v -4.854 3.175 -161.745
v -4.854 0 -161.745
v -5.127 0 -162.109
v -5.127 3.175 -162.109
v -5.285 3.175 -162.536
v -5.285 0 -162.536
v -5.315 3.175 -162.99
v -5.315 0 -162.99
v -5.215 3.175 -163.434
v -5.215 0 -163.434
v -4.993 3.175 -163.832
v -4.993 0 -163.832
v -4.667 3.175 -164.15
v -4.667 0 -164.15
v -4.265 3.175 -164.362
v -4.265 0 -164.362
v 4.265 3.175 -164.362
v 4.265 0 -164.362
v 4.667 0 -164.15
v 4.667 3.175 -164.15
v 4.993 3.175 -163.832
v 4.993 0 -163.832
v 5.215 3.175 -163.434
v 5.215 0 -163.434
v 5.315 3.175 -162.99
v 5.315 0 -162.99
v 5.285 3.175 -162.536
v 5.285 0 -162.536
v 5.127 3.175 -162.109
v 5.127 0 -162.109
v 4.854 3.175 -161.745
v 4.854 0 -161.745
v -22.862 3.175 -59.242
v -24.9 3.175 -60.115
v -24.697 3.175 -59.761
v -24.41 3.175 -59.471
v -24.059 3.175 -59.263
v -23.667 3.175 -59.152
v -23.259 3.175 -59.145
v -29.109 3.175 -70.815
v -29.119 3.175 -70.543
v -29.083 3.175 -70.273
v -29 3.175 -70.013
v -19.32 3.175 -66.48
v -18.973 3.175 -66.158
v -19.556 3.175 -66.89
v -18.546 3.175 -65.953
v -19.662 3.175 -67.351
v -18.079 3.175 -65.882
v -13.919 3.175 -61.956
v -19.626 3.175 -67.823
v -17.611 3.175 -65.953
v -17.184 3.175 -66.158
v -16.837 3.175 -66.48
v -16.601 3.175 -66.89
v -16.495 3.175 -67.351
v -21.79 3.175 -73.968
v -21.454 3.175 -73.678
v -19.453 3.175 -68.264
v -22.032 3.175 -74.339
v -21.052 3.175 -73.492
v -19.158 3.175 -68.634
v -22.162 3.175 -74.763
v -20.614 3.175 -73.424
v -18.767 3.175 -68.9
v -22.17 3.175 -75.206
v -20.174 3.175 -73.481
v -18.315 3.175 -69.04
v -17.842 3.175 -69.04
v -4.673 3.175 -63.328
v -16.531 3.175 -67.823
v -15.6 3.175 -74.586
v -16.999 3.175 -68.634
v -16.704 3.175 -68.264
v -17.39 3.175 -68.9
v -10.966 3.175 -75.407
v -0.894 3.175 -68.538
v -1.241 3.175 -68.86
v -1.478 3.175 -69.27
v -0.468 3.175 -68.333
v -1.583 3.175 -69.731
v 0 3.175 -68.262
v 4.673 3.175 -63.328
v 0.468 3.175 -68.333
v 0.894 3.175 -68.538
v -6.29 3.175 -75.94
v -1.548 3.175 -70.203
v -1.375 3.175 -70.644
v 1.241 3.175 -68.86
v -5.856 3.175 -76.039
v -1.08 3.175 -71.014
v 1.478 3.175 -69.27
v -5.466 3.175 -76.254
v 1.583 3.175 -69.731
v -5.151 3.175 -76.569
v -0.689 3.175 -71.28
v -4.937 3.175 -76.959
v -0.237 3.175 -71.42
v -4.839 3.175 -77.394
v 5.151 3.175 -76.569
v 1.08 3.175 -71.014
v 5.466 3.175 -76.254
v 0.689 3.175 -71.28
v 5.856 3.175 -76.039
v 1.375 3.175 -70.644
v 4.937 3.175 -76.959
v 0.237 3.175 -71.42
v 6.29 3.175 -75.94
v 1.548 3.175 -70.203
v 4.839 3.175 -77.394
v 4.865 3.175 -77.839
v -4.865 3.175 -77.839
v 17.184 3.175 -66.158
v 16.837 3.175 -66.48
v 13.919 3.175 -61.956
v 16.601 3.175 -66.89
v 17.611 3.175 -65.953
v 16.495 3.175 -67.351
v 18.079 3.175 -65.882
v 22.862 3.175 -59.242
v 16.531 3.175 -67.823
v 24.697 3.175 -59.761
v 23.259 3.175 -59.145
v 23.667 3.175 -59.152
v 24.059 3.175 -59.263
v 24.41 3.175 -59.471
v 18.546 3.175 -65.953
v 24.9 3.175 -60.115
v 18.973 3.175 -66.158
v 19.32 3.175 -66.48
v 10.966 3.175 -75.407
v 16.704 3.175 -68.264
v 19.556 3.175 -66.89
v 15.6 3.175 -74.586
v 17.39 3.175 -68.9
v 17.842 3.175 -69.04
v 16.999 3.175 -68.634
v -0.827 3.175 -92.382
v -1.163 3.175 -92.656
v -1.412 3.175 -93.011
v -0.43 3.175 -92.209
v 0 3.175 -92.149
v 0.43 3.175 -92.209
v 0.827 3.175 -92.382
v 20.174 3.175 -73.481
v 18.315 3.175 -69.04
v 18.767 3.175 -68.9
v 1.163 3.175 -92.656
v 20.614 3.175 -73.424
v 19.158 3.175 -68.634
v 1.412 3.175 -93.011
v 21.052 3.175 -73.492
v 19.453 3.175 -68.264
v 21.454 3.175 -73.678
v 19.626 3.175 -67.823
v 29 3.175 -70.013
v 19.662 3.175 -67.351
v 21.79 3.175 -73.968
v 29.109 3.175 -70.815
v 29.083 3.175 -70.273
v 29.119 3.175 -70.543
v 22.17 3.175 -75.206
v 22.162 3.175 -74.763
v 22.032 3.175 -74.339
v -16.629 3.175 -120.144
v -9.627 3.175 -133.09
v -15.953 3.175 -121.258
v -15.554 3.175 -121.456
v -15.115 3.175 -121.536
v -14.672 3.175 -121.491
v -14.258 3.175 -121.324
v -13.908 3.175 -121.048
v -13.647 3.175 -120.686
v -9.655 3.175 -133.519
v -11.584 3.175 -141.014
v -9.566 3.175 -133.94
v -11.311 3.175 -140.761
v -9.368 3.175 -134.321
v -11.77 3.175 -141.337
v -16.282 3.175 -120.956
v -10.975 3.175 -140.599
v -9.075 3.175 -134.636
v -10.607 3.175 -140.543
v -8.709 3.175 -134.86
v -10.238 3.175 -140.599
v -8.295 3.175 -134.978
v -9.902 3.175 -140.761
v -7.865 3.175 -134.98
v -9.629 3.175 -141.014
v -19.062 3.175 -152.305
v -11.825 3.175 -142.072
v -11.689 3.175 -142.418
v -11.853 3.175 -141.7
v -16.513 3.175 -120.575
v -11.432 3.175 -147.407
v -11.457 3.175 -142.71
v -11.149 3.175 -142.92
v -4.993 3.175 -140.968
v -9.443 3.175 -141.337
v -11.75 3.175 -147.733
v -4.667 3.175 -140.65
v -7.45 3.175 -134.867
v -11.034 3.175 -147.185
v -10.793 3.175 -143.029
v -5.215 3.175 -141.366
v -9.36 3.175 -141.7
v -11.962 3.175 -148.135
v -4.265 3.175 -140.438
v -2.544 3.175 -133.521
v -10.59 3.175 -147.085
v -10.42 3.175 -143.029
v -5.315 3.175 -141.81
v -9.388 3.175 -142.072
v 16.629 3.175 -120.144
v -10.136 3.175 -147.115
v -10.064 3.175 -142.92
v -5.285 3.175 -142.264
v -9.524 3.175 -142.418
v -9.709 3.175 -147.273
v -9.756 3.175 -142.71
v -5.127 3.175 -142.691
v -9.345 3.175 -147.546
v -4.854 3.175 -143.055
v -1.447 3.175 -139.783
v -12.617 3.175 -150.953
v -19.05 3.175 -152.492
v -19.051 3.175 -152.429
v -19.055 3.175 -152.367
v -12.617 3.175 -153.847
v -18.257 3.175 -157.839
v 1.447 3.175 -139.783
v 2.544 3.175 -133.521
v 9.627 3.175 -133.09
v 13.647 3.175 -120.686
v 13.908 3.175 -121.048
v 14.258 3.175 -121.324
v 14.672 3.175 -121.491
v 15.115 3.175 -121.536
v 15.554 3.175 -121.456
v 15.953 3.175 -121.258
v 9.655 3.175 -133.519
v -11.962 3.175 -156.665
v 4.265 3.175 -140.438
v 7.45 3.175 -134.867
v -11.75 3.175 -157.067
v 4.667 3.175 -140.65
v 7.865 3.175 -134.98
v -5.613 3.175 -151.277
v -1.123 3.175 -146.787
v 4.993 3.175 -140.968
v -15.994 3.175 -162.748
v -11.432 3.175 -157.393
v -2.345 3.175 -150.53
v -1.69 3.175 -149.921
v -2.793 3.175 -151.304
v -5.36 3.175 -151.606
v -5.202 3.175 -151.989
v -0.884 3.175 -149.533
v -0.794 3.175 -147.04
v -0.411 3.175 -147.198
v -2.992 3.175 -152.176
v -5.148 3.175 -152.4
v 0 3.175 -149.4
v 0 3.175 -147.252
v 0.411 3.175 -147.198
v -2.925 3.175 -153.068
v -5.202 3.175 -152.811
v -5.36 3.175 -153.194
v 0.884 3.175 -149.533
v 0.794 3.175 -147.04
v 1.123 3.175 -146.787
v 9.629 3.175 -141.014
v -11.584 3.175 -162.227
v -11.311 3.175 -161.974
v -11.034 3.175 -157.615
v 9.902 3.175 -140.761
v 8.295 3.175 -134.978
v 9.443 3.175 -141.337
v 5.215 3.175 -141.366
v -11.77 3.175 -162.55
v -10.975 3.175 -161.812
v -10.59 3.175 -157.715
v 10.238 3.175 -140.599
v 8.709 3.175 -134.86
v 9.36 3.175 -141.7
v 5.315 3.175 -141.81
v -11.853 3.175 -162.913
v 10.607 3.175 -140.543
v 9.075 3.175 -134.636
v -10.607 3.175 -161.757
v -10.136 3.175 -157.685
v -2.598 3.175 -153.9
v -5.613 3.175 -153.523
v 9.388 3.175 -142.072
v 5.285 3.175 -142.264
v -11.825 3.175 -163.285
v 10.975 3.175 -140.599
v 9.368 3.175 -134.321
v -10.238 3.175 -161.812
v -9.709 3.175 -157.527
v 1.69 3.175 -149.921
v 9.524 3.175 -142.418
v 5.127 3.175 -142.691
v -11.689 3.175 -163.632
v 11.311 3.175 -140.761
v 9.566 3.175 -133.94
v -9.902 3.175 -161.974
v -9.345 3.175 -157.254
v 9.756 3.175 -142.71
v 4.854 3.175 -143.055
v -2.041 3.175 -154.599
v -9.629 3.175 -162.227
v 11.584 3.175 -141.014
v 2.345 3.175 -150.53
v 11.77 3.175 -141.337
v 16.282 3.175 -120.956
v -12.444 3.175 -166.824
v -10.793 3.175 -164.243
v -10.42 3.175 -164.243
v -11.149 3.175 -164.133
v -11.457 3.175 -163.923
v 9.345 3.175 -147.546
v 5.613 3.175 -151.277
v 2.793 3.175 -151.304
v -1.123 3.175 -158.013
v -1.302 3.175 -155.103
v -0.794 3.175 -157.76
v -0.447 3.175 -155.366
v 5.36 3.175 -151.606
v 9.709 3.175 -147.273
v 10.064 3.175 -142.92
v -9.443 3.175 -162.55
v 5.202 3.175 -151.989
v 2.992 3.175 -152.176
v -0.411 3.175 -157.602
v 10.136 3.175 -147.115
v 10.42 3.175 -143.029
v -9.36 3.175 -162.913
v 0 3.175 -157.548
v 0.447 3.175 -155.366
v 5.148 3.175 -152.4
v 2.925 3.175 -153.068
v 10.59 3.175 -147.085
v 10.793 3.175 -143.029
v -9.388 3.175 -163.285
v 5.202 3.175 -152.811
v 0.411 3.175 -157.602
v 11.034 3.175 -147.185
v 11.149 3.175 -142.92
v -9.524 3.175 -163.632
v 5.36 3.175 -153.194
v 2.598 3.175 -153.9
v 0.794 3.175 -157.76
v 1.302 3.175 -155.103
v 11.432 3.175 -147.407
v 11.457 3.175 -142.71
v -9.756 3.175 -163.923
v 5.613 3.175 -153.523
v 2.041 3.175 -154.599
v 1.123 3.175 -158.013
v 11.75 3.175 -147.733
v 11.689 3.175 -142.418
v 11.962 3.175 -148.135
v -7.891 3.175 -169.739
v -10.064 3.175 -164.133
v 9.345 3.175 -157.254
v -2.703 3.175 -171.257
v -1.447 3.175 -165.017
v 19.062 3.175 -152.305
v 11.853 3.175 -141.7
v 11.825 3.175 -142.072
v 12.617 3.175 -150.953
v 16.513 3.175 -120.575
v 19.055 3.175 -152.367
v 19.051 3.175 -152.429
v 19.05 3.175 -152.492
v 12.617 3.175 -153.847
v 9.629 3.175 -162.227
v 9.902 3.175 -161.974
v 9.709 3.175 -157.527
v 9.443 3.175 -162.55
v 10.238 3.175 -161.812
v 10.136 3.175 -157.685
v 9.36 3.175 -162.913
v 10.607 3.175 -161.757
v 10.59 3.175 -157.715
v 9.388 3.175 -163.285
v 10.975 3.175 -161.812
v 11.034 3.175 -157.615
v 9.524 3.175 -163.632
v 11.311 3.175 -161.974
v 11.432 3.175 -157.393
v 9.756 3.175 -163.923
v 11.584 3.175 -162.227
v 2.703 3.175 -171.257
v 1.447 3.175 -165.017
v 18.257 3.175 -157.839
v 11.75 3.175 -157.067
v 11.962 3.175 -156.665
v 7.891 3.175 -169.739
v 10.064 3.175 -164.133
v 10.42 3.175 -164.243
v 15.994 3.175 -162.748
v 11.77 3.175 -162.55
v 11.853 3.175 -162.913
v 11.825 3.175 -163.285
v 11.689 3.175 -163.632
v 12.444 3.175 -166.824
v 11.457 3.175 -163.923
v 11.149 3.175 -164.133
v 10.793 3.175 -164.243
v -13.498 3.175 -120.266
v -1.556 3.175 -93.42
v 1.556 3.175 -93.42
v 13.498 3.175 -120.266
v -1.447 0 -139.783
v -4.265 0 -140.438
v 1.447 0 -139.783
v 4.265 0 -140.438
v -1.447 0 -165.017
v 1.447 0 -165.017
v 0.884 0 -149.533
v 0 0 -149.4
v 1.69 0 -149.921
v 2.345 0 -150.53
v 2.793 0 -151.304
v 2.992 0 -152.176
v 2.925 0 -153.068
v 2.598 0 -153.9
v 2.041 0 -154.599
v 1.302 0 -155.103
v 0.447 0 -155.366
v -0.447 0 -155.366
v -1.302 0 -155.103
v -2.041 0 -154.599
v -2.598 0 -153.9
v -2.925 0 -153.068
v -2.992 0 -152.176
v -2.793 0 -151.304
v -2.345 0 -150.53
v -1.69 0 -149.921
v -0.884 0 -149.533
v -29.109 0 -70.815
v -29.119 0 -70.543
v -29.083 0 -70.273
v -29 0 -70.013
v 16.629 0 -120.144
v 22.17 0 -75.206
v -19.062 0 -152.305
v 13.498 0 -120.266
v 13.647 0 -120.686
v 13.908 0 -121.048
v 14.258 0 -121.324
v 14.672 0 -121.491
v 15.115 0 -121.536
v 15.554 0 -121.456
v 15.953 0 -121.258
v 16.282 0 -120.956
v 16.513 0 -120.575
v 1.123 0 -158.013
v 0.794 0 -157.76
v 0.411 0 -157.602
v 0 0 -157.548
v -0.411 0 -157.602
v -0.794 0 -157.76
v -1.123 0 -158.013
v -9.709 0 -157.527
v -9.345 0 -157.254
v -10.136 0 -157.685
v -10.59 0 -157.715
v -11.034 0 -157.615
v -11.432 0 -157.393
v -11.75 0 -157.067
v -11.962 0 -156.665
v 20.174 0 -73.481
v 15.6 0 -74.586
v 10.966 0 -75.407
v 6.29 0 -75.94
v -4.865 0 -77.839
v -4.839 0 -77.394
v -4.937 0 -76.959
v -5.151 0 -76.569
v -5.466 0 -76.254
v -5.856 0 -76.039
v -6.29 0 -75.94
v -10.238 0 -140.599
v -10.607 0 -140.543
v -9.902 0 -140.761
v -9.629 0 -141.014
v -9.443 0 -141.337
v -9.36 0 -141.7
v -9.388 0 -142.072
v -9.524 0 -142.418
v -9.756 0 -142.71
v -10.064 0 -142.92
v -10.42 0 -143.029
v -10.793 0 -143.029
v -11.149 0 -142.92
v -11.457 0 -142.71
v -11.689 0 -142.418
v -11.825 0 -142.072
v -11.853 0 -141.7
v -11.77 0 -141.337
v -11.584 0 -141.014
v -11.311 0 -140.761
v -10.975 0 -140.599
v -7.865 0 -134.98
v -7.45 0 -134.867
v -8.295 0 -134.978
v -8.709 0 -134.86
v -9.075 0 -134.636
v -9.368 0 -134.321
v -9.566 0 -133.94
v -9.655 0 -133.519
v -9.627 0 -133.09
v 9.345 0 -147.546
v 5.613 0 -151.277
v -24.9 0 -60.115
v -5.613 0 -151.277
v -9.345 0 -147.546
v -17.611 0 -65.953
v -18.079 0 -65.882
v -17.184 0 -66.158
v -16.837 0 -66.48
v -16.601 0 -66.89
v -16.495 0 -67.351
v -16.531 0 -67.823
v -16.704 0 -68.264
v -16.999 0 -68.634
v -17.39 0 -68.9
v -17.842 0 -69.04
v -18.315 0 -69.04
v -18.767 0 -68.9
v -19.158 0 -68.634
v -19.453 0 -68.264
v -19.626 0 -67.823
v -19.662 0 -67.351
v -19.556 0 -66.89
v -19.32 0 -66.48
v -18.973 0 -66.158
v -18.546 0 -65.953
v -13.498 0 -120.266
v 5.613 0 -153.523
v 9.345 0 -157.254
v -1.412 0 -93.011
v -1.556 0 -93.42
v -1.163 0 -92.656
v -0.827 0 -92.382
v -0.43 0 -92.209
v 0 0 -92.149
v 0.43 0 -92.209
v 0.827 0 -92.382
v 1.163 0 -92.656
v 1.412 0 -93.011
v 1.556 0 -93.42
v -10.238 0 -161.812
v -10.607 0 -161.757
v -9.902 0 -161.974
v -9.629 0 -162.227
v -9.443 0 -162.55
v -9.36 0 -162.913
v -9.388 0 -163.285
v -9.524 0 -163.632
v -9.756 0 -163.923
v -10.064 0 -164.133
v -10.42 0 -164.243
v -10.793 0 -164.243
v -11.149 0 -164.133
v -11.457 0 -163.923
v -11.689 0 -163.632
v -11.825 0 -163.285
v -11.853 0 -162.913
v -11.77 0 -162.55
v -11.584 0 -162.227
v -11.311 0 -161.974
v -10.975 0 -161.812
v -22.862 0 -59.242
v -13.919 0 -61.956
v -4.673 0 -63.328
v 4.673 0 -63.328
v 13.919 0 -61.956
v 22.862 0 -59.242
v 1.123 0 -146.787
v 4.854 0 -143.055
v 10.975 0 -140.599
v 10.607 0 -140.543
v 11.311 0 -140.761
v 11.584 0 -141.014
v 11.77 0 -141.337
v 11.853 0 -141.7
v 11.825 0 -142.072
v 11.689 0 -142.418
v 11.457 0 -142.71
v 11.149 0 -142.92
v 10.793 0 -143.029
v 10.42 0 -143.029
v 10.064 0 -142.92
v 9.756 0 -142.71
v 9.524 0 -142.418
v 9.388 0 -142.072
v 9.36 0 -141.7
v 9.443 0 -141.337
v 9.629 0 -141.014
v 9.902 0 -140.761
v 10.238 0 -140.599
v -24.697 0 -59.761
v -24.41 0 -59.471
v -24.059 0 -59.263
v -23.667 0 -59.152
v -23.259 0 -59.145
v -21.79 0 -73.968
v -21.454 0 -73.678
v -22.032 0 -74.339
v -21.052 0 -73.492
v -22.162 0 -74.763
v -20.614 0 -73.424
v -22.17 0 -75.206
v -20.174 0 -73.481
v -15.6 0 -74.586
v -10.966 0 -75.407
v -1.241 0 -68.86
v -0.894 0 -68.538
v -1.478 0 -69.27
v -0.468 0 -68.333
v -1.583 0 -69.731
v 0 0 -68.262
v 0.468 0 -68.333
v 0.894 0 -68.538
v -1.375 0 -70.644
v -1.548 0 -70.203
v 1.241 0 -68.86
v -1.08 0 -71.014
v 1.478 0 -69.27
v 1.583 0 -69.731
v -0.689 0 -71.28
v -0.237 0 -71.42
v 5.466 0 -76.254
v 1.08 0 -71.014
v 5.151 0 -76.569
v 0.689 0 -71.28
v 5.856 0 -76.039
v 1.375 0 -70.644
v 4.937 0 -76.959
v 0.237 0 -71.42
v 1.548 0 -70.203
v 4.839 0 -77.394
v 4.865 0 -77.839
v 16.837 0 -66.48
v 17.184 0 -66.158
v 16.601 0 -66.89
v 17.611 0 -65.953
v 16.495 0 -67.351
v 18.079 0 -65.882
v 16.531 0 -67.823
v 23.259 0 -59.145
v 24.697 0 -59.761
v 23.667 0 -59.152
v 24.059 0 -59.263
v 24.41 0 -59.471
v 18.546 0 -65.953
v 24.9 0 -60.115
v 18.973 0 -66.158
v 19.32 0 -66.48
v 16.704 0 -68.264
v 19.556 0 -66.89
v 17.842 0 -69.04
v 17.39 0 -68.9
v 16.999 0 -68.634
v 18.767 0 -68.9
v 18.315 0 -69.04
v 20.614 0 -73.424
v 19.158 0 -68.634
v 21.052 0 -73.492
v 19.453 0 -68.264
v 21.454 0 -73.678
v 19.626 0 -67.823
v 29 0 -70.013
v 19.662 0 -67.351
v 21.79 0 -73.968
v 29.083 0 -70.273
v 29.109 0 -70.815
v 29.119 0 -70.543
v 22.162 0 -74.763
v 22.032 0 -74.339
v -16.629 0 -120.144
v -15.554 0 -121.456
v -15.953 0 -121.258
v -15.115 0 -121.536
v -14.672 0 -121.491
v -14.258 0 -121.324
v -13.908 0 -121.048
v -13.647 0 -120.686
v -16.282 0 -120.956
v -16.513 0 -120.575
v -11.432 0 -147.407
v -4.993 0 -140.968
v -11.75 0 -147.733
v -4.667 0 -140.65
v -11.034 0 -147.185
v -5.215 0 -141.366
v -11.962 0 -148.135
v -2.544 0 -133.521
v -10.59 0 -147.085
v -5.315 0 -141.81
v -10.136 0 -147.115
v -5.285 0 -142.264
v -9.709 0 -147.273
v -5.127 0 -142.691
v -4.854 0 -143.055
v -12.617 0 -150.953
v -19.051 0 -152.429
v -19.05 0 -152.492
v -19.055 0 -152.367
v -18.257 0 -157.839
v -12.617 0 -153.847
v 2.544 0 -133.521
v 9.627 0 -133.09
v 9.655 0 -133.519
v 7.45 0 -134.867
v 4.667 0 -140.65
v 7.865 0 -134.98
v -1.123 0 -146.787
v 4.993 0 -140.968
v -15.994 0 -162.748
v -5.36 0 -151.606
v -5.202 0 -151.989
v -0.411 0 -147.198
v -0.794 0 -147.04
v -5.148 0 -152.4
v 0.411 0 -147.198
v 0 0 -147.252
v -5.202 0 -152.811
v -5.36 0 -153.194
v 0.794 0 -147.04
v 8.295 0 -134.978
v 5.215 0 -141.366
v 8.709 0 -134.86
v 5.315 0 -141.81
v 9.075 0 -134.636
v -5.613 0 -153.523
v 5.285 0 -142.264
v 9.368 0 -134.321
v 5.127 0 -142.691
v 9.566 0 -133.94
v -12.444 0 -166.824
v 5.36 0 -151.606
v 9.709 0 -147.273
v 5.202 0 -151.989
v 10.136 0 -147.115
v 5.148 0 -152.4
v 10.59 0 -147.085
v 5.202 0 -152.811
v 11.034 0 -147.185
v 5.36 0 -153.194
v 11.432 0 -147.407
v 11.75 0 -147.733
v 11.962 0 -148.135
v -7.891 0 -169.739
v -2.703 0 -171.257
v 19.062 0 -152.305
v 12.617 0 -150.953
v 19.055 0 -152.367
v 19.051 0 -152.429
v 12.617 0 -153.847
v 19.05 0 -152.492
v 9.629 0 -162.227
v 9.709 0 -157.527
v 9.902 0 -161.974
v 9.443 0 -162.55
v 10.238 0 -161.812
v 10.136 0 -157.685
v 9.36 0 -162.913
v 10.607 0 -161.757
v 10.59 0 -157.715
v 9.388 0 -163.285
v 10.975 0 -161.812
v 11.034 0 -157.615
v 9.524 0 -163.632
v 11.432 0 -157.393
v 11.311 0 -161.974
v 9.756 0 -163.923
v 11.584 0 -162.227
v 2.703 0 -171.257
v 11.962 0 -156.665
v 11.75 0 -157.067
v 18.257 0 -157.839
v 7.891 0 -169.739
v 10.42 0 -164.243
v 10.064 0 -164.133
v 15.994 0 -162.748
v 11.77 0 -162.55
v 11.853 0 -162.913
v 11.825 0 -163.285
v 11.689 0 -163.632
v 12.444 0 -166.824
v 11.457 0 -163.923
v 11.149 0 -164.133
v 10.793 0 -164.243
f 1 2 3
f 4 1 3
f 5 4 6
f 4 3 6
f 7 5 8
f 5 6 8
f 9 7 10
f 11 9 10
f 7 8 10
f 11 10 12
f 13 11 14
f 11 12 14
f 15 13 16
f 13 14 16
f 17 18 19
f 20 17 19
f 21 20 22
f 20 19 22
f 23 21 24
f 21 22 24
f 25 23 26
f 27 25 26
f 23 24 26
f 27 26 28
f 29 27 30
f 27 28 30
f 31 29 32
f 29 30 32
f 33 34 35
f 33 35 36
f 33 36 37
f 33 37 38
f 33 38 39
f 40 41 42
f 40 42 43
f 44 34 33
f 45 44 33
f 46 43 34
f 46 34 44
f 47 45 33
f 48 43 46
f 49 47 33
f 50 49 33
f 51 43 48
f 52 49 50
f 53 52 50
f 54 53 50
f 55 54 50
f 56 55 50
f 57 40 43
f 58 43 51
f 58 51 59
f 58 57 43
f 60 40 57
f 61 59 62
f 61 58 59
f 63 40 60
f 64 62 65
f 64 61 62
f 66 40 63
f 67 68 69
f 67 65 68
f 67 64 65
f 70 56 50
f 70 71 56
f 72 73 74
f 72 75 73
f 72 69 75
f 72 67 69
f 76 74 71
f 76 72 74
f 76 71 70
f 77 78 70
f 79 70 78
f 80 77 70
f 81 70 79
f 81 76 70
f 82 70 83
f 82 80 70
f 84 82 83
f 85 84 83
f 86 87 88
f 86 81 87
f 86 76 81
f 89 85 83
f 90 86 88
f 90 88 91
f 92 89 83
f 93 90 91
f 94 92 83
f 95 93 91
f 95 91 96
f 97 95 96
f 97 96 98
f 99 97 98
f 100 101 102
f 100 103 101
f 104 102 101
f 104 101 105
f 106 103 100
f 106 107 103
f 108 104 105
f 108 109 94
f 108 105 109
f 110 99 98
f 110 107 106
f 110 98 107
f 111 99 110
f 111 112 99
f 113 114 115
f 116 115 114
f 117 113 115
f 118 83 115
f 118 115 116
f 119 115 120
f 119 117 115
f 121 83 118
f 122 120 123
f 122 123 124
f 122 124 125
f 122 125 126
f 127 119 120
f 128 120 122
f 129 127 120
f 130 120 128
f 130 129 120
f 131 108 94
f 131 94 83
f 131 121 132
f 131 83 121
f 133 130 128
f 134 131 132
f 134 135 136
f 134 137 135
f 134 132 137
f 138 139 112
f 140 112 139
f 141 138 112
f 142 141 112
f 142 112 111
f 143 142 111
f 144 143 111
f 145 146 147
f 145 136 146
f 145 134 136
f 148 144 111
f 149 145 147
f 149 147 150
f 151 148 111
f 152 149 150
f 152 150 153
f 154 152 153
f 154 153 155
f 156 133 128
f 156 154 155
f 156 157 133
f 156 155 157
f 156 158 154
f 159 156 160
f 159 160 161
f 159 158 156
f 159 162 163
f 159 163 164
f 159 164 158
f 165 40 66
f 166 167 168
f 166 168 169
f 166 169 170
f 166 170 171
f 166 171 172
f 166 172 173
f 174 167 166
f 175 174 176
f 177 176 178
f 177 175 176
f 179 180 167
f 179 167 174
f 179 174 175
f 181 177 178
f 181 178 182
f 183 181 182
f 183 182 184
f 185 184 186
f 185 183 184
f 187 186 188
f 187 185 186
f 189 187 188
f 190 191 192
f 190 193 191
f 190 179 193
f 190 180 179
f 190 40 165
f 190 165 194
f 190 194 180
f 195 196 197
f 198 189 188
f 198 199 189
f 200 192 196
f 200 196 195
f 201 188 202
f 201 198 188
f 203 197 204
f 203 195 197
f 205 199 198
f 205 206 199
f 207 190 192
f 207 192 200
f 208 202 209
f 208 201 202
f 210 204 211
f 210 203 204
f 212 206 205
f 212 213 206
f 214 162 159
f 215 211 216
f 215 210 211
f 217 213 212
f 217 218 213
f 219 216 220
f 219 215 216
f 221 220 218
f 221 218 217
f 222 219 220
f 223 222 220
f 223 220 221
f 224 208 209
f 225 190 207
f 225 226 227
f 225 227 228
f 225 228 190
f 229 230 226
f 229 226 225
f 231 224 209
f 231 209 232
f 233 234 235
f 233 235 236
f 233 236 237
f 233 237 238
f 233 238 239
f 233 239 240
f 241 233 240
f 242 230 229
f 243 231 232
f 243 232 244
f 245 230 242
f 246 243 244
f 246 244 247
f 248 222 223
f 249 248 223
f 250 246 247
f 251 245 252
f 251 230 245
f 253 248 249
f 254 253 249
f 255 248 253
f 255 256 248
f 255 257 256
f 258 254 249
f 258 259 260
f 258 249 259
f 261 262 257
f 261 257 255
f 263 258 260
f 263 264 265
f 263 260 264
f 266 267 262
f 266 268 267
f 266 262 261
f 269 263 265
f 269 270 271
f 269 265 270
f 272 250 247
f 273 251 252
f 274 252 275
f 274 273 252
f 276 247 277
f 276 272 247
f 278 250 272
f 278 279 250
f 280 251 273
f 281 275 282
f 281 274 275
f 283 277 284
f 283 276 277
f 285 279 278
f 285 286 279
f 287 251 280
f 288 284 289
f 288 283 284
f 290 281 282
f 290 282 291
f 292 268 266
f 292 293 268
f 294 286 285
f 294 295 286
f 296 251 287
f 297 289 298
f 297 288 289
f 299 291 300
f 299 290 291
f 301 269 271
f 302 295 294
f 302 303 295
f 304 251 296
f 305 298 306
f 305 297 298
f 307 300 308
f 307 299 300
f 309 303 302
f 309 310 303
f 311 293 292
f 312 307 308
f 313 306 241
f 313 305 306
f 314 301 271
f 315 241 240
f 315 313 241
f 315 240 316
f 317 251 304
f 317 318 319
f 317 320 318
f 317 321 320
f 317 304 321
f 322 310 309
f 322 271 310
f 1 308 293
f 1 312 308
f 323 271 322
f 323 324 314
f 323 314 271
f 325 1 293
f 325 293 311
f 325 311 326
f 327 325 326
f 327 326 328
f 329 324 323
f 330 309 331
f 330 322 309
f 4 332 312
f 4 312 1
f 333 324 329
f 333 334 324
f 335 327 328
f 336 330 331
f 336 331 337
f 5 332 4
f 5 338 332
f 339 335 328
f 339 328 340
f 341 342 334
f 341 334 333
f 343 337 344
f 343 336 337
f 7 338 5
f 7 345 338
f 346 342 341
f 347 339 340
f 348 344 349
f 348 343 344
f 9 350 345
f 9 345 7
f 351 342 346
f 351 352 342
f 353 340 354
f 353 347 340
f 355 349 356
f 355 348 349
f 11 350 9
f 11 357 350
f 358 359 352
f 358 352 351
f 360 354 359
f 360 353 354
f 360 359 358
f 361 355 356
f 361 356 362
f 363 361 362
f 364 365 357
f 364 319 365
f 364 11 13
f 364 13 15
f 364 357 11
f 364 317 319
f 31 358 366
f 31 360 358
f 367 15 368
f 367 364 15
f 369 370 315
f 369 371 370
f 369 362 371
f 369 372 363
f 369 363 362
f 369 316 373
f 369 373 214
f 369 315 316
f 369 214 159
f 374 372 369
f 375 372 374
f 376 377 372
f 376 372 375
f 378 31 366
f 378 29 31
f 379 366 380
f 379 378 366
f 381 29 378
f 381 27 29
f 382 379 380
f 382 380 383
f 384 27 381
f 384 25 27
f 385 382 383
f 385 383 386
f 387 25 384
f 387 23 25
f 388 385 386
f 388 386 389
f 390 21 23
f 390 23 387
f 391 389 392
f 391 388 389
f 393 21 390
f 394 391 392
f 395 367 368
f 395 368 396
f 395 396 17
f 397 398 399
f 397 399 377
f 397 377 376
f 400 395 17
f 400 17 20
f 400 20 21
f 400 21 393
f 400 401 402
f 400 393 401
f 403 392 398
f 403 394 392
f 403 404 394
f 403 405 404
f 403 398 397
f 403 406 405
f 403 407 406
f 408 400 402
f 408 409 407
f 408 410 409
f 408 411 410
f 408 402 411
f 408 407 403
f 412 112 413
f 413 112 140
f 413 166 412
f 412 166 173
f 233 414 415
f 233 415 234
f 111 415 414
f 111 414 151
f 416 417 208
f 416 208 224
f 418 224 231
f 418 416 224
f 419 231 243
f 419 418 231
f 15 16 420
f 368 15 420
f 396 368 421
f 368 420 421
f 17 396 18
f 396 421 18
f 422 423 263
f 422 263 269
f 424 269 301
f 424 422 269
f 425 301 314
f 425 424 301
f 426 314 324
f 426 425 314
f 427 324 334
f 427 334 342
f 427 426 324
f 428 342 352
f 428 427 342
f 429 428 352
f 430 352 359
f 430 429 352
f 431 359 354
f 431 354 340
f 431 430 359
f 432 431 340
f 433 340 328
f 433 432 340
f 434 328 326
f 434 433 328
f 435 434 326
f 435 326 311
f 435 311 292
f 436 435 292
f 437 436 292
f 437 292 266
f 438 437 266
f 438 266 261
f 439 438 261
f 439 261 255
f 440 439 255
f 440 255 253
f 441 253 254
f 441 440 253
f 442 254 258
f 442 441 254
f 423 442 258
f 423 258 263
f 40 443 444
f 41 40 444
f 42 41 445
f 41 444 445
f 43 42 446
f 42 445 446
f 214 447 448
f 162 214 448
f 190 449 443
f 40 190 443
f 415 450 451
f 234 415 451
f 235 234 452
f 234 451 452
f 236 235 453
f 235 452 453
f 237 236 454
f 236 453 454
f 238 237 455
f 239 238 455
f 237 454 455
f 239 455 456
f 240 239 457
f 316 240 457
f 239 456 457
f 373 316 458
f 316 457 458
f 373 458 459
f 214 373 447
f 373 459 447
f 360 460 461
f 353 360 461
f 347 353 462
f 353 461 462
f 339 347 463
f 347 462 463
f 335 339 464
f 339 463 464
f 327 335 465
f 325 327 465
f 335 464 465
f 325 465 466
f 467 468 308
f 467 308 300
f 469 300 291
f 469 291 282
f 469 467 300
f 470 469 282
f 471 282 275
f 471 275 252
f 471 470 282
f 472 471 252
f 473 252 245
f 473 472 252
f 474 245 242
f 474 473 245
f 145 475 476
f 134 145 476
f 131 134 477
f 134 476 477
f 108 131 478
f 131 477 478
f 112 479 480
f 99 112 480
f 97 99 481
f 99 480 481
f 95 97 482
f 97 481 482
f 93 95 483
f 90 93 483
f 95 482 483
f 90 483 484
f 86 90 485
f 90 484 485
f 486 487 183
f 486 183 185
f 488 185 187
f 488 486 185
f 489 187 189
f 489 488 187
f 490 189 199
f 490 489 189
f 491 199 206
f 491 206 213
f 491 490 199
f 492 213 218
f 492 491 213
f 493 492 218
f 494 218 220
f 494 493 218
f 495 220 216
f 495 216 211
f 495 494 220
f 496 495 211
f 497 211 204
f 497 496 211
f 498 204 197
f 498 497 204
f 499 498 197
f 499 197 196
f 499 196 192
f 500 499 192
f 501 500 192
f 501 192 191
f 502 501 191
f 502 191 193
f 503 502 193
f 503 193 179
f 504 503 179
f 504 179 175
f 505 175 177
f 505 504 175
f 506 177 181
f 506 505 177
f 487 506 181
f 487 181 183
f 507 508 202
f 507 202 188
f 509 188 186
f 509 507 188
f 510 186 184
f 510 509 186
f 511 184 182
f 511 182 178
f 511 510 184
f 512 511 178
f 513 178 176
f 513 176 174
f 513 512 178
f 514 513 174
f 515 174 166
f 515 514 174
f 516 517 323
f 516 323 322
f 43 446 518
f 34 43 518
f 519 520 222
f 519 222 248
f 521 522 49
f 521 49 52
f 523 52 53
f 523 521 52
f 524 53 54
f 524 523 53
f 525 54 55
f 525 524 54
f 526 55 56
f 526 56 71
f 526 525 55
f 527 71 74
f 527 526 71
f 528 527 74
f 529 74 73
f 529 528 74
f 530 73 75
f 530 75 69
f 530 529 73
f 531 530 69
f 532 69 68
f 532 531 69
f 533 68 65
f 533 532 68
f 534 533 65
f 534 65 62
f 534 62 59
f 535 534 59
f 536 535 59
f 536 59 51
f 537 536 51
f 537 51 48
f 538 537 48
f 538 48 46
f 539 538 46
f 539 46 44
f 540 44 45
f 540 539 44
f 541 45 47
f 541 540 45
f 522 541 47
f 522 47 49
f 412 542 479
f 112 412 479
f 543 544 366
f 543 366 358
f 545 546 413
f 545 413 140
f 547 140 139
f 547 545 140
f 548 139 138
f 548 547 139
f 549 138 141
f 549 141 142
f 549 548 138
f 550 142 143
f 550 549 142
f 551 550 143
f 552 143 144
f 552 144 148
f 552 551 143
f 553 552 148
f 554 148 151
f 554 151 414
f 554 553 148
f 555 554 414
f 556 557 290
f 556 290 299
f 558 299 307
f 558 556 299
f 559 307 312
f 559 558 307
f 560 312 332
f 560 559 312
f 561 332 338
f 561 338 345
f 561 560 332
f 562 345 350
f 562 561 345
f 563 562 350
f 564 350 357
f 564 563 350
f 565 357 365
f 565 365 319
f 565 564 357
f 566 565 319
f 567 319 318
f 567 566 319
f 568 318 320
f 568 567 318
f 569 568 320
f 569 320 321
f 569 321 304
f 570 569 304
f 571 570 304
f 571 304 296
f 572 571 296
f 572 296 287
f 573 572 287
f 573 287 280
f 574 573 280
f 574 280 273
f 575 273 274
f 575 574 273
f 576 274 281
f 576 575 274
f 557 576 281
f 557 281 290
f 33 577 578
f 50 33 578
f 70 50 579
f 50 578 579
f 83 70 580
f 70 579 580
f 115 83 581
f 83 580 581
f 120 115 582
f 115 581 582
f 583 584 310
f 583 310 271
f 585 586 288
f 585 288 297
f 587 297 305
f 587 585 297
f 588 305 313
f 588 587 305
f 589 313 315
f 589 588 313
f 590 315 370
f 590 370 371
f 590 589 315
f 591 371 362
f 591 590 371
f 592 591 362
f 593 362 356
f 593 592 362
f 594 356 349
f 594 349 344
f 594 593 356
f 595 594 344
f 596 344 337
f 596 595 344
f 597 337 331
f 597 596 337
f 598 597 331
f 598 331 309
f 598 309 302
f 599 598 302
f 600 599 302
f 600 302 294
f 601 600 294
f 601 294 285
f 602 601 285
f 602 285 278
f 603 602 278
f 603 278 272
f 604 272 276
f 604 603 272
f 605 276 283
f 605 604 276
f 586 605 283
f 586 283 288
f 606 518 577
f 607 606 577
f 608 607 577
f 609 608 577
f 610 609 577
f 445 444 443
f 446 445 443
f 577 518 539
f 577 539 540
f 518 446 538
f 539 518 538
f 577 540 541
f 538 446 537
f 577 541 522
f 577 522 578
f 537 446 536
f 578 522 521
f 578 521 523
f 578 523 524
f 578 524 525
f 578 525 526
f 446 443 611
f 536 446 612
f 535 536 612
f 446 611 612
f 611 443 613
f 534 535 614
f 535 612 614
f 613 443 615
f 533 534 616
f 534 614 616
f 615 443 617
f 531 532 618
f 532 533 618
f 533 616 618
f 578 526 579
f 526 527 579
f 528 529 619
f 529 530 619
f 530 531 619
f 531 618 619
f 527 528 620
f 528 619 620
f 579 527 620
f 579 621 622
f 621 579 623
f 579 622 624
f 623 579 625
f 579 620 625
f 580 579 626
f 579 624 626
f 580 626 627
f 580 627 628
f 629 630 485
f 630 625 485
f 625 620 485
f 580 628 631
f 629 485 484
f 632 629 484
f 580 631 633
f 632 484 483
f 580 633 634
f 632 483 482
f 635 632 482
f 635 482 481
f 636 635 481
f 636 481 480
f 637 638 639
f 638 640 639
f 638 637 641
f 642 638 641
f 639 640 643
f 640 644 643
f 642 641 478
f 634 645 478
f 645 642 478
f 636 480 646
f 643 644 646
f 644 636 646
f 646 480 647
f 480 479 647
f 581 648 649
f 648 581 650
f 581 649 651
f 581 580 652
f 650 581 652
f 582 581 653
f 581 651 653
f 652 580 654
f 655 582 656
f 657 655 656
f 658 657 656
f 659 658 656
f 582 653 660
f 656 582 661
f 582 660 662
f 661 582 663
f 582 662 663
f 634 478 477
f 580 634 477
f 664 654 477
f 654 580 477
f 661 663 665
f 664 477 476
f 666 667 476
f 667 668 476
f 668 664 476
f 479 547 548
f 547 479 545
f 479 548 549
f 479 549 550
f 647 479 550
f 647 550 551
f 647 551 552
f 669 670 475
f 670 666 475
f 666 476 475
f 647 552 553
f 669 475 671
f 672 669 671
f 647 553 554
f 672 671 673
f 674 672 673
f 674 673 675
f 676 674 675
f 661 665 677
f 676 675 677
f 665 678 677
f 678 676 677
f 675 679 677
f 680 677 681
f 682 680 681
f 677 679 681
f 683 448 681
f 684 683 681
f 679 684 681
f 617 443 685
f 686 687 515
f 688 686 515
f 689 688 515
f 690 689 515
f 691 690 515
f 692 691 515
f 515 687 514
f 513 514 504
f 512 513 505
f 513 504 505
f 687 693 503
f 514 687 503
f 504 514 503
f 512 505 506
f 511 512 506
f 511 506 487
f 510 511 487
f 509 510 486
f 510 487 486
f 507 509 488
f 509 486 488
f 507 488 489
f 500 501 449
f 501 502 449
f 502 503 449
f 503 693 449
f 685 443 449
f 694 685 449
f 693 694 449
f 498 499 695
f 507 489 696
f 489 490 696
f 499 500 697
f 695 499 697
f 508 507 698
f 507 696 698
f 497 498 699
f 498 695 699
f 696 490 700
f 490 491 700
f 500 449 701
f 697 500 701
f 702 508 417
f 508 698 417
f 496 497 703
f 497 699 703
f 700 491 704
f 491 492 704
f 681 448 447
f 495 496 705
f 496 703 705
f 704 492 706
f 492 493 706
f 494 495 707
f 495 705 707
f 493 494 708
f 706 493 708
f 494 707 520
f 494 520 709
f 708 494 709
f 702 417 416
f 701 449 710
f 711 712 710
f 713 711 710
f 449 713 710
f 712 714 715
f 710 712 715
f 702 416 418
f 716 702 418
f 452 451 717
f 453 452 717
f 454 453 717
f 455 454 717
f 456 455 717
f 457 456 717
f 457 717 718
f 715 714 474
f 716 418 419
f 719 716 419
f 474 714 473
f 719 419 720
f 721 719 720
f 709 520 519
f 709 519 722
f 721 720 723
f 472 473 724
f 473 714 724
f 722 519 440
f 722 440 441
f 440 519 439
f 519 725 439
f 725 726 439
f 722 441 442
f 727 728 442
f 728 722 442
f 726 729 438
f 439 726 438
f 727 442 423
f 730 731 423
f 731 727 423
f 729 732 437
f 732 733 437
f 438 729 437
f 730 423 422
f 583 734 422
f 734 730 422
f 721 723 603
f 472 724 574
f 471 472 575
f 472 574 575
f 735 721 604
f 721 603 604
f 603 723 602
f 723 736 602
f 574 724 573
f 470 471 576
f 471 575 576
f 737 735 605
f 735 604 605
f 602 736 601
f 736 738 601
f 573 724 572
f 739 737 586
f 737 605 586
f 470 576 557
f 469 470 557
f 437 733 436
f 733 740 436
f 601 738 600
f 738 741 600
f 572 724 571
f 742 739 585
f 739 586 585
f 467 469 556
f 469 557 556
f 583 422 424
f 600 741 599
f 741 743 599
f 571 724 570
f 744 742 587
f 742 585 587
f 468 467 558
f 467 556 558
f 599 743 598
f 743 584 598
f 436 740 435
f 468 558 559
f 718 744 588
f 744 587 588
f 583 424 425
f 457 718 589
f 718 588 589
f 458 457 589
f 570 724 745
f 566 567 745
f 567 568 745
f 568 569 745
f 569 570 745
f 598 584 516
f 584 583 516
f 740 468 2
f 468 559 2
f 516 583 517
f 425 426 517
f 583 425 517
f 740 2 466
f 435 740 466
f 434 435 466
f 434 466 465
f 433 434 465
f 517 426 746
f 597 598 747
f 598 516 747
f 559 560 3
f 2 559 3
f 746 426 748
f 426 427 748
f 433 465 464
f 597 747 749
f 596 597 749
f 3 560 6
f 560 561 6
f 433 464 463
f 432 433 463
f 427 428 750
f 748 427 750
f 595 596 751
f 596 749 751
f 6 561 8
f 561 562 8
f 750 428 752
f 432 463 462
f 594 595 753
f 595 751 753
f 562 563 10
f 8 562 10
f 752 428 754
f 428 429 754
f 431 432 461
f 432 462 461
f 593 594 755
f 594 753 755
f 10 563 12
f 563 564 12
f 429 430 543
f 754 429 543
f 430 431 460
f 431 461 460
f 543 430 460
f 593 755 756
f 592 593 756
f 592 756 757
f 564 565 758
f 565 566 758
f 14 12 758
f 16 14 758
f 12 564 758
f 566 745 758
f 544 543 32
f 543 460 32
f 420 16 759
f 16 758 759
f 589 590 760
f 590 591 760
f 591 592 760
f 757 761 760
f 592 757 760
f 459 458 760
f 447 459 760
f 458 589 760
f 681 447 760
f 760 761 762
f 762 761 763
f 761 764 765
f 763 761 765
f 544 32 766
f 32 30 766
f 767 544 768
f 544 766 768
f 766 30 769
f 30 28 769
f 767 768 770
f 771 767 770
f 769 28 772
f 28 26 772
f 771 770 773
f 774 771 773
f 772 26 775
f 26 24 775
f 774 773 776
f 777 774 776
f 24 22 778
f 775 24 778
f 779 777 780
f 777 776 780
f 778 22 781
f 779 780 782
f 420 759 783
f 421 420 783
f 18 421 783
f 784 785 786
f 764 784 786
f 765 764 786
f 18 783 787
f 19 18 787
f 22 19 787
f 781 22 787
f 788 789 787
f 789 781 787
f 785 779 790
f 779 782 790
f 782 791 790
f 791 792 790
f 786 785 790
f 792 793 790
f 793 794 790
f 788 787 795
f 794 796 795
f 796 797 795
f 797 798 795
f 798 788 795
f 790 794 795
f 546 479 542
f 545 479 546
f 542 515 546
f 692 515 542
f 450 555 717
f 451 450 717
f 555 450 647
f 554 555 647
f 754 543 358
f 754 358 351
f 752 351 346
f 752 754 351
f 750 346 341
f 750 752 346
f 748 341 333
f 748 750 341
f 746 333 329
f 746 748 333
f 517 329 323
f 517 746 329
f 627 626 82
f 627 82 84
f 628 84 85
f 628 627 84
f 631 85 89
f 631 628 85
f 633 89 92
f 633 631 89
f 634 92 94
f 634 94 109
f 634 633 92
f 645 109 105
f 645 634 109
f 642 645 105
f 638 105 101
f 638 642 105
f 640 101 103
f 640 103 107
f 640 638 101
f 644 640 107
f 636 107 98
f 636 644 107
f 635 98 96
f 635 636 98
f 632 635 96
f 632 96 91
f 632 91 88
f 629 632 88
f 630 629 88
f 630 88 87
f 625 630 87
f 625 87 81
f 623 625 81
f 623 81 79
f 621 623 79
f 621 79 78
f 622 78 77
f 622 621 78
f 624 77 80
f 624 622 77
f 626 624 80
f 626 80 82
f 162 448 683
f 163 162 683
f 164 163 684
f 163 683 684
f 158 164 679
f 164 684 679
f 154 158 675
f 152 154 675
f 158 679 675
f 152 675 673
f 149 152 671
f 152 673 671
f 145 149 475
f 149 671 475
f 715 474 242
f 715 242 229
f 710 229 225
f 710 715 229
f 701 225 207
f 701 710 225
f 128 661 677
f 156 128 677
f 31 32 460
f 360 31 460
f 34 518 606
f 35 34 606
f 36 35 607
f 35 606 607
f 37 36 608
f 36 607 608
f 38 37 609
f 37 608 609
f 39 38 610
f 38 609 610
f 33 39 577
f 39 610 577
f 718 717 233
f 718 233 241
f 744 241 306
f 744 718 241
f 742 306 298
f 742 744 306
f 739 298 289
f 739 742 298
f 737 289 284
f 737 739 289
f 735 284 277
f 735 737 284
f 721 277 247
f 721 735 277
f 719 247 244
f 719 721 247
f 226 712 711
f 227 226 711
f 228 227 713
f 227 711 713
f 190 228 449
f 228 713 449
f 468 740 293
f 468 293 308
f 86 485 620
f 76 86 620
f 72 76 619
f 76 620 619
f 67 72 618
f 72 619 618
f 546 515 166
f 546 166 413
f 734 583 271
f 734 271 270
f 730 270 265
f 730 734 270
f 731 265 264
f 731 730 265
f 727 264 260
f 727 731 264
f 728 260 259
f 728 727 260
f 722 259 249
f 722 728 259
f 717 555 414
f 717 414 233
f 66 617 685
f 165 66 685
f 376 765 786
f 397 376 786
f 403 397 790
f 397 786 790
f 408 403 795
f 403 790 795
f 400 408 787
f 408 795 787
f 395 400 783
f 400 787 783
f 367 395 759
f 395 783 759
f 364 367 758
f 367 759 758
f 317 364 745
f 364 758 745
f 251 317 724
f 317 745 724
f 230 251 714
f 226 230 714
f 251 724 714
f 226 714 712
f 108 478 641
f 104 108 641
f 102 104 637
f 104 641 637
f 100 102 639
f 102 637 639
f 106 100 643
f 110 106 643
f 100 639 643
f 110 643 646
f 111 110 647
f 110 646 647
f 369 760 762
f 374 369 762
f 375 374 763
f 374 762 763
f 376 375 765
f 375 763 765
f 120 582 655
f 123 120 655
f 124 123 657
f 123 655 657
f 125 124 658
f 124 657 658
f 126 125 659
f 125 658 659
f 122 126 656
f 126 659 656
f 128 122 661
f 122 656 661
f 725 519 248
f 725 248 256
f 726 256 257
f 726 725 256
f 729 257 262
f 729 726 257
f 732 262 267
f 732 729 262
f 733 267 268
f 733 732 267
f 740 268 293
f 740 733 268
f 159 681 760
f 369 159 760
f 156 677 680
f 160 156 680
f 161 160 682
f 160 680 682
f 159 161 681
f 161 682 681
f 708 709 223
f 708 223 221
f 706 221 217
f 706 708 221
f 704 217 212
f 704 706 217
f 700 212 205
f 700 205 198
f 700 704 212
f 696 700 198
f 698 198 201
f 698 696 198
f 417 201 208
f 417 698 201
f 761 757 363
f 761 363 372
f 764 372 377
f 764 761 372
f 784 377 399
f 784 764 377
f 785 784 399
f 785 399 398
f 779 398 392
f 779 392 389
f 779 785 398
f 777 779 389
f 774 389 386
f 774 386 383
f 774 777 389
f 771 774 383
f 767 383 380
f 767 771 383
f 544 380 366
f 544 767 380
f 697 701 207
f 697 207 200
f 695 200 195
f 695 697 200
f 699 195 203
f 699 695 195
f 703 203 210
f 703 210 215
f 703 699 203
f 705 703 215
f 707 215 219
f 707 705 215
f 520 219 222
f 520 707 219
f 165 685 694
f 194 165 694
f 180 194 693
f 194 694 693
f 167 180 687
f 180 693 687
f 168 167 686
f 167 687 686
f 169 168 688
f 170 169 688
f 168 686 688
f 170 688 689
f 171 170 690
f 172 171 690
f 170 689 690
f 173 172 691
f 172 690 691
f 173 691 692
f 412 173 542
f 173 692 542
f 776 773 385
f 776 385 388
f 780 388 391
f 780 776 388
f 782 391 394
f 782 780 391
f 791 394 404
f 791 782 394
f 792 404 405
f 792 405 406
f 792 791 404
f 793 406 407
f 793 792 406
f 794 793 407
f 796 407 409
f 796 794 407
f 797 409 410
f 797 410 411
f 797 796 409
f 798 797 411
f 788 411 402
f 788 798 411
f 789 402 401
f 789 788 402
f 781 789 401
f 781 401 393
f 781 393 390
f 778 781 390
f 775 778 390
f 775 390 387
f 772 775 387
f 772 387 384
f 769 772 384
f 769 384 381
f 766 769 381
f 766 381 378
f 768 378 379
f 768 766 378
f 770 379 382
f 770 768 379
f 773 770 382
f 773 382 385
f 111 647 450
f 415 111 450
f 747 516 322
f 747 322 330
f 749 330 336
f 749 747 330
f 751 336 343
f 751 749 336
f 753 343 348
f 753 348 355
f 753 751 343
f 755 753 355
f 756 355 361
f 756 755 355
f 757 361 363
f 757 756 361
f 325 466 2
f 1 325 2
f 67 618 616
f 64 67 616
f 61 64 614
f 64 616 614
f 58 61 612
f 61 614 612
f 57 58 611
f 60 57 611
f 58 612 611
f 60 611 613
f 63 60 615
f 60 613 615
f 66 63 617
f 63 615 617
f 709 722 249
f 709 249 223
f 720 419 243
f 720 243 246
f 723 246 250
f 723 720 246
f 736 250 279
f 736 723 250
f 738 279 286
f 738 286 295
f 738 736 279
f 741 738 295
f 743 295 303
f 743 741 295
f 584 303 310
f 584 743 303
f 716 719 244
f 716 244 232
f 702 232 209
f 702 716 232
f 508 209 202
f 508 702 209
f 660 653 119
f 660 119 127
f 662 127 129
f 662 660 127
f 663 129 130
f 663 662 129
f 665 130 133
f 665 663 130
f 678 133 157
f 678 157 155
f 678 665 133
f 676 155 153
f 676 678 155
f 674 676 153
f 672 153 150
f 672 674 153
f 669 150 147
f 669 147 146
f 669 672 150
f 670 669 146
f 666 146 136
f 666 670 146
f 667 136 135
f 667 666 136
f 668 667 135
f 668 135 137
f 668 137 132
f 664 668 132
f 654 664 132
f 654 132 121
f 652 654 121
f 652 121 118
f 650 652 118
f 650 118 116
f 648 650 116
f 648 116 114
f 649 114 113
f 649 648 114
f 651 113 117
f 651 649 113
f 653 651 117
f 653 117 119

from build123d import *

# Parameters (mm, degrees)
SKETCH1_R           = 1.25
SKETCH1_R_2         = 1.5875
SKETCH1_R_3         = 1.587499999
SKETCH1_R_4         = 3
BOSS_EXTRUDE1_DEPTH = 3.175


with BuildPart() as part:
    # Sketch1 → Boss-Extrude1 (new body)
    with BuildSketch(Plane(origin=(0, 0, 0), x_dir=(1, 0, 0), z_dir=(0, 1, 0))):
        with BuildLine():
            Line((-19.061691445, 152.305177286), (-29.109279467, 70.814859111))
            ThreePointArc((-29.109279467, 70.814859111), (-29.106764186, 70.406916612), (-29.000369251, 70.01308476))
            Line((-29.000369251, 70.01308476), (-24.900498144, 60.115120329))
            ThreePointArc((-24.900498144, 60.115120329), (-24.059191565, 59.263489811), (-22.862282328, 59.241590515))
            ThreePointArc((-22.862282328, 59.241590515), (0, 63.5), (22.862282328, 59.241590515))
            ThreePointArc((22.862282328, 59.241590515), (24.059191565, 59.263489811), (24.900498144, 60.115120329))
            Line((24.900498144, 60.115120329), (29.000369251, 70.01308476))
            ThreePointArc((29.000369251, 70.01308476), (29.106764186, 70.406916612), (29.109279467, 70.814859111))
            Line((29.109279467, 70.814859111), (19.061691445, 152.305177286))
            ThreePointArc((19.061691445, 152.305177286), (19.052985039, 152.398309253), (19.049778848, 152.491792328))
            ThreePointArc((19.049778848, 152.491792328), (0, 171.45), (-19.049778848, 152.491792328))
            ThreePointArc((-19.049778848, 152.491792328), (-19.052985039, 152.398309253), (-19.061691445, 152.305177286))
        make_face()
        with Locations(Location((-10.606601718, 163.006601718, 0), (0, 0, 270))):
            Circle(SKETCH1_R, mode=Mode.SUBTRACT)
        with Locations(Location((0, 69.85, 0), (0, 0, 270))):
            Circle(SKETCH1_R_2, mode=Mode.SUBTRACT)
        with Locations(Location((18.0785103, 67.469918962, 0), (0, 0, 270))):
            Circle(SKETCH1_R_2, mode=Mode.SUBTRACT)
        with Locations(Location((10.606601718, 163.006601718, 0), (0, 0, 270))):
            Circle(SKETCH1_R, mode=Mode.SUBTRACT)
        with Locations(Location((10.606601718, 141.793398282, 0), (0, 0, 270))):
            Circle(SKETCH1_R, mode=Mode.SUBTRACT)
        with Locations(Location((-10.606601718, 141.793398282, 0), (0, 0, 270))):
            Circle(SKETCH1_R, mode=Mode.SUBTRACT)
        with Locations(Location((-18.078510302, 67.469918971, 0), (0, 0, 270))):
            Circle(SKETCH1_R_3, mode=Mode.SUBTRACT)
        with Locations(Location((0, 152.4, 0), (0, 0, 270))):
            Circle(SKETCH1_R_4, mode=Mode.SUBTRACT)
        with BuildLine():
            Line((-13.497810395, 120.266290898), (-4.865408959, 77.838541906))
            ThreePointArc((-4.865408959, 77.838541906), (-5.15124286, 76.569257194), (-6.289995152, 75.939949704))
            ThreePointArc((-6.289995152, 75.939949704), (-13.288948331, 75.032285399), (-20.173905346, 73.480974021))
            ThreePointArc((-20.173905346, 73.480974021), (-21.632306598, 73.810794489), (-22.169764015, 75.206092049))
            Line((-22.169764015, 75.206092049), (-16.629007128, 120.144045384))
            ThreePointArc((-16.629007128, 120.144045384), (-15.115368796, 121.53607252), (-13.497810395, 120.266290898))
        make_face(mode=Mode.SUBTRACT)
        with BuildLine():
            Line((-9.626782179, 133.089731304), (-1.555627758, 93.42047862))
            ThreePointArc((-1.555627758, 93.42047862), (0, 92.149488537), (1.555627758, 93.42047862))
            Line((1.555627758, 93.42047862), (9.626782179, 133.089731304))
            ThreePointArc((9.626782179, 133.089731304), (9.075338598, 134.635781943), (7.450296388, 134.867299588))
            ThreePointArc((7.450296388, 134.867299588), (0, 133.35), (-7.450296388, 134.867299588))
            ThreePointArc((-7.450296388, 134.867299588), (-9.075338598, 134.635781943), (-9.626782179, 133.089731304))
        make_face(mode=Mode.SUBTRACT)
        with BuildLine():
            Line((4.854451798, 161.744579859), (1.122532015, 158.012660076))
            ThreePointArc((1.122532015, 158.012660076), (0, 157.547692091), (-1.122532015, 158.012660076))
            Line((-1.122532015, 158.012660076), (-4.854451798, 161.744579859))
            ThreePointArc((-4.854451798, 161.744579859), (-5.280651093, 163.215805982), (-4.265051181, 164.36241357))
            ThreePointArc((-4.265051181, 164.36241357), (0, 165.1), (4.265051181, 164.36241357))
            ThreePointArc((4.265051181, 164.36241357), (5.280651093, 163.215805982), (4.854451798, 161.744579859))
        make_face(mode=Mode.SUBTRACT)
        with BuildLine():
            Line((-1.122532015, 146.787339924), (-4.854451798, 143.055420141))
            ThreePointArc((-4.854451798, 143.055420141), (-5.280651093, 141.584194018), (-4.265051181, 140.43758643))
            ThreePointArc((-4.265051181, 140.43758643), (0, 139.7), (4.265051181, 140.43758643))
            ThreePointArc((4.265051181, 140.43758643), (5.280651093, 141.584194018), (4.854451798, 143.055420141))
            Line((4.854451798, 143.055420141), (1.122532015, 146.787339924))
            ThreePointArc((1.122532015, 146.787339924), (0, 147.252307909), (-1.122532015, 146.787339924))
        make_face(mode=Mode.SUBTRACT)
        with BuildLine():
            Line((9.344579859, 157.254451798), (5.612660076, 153.522532015))
            ThreePointArc((5.612660076, 153.522532015), (5.147692091, 152.4), (5.612660076, 151.277467985))
            Line((5.612660076, 151.277467985), (9.344579859, 147.545548202))
            ThreePointArc((9.344579859, 147.545548202), (10.815805982, 147.119348907), (11.96241357, 148.134948819))
            ThreePointArc((11.96241357, 148.134948819), (12.7, 152.4), (11.96241357, 156.665051181))
            ThreePointArc((11.96241357, 156.665051181), (10.815805982, 157.680651093), (9.344579859, 157.254451798))
        make_face(mode=Mode.SUBTRACT)
        with BuildLine():
            Line((4.865408959, 77.838541906), (13.497810395, 120.266290898))
            ThreePointArc((13.497810395, 120.266290898), (15.115368796, 121.53607252), (16.629007128, 120.144045384))
            Line((16.629007128, 120.144045384), (22.169764015, 75.206092049))
            ThreePointArc((22.169764015, 75.206092049), (21.632306598, 73.810794489), (20.173905346, 73.480974021))
            ThreePointArc((20.173905346, 73.480974021), (13.288948331, 75.032285399), (6.289995152, 75.939949704))
            ThreePointArc((6.289995152, 75.939949704), (5.15124286, 76.569257194), (4.865408959, 77.838541906))
        make_face(mode=Mode.SUBTRACT)
        with BuildLine():
            Line((-5.612660076, 153.522532015), (-9.344579859, 157.254451798))
            ThreePointArc((-9.344579859, 157.254451798), (-10.815805982, 157.680651093), (-11.96241357, 156.665051181))
            ThreePointArc((-11.96241357, 156.665051181), (-12.7, 152.4), (-11.96241357, 148.134948819))
            ThreePointArc((-11.96241357, 148.134948819), (-10.815805982, 147.119348907), (-9.344579859, 147.545548202))
            Line((-9.344579859, 147.545548202), (-5.612660076, 151.277467985))
            ThreePointArc((-5.612660076, 151.277467985), (-5.147692091, 152.4), (-5.612660076, 153.522532015))
        make_face(mode=Mode.SUBTRACT)
    extrude(amount=BOSS_EXTRUDE1_DEPTH)


solid = part.part
